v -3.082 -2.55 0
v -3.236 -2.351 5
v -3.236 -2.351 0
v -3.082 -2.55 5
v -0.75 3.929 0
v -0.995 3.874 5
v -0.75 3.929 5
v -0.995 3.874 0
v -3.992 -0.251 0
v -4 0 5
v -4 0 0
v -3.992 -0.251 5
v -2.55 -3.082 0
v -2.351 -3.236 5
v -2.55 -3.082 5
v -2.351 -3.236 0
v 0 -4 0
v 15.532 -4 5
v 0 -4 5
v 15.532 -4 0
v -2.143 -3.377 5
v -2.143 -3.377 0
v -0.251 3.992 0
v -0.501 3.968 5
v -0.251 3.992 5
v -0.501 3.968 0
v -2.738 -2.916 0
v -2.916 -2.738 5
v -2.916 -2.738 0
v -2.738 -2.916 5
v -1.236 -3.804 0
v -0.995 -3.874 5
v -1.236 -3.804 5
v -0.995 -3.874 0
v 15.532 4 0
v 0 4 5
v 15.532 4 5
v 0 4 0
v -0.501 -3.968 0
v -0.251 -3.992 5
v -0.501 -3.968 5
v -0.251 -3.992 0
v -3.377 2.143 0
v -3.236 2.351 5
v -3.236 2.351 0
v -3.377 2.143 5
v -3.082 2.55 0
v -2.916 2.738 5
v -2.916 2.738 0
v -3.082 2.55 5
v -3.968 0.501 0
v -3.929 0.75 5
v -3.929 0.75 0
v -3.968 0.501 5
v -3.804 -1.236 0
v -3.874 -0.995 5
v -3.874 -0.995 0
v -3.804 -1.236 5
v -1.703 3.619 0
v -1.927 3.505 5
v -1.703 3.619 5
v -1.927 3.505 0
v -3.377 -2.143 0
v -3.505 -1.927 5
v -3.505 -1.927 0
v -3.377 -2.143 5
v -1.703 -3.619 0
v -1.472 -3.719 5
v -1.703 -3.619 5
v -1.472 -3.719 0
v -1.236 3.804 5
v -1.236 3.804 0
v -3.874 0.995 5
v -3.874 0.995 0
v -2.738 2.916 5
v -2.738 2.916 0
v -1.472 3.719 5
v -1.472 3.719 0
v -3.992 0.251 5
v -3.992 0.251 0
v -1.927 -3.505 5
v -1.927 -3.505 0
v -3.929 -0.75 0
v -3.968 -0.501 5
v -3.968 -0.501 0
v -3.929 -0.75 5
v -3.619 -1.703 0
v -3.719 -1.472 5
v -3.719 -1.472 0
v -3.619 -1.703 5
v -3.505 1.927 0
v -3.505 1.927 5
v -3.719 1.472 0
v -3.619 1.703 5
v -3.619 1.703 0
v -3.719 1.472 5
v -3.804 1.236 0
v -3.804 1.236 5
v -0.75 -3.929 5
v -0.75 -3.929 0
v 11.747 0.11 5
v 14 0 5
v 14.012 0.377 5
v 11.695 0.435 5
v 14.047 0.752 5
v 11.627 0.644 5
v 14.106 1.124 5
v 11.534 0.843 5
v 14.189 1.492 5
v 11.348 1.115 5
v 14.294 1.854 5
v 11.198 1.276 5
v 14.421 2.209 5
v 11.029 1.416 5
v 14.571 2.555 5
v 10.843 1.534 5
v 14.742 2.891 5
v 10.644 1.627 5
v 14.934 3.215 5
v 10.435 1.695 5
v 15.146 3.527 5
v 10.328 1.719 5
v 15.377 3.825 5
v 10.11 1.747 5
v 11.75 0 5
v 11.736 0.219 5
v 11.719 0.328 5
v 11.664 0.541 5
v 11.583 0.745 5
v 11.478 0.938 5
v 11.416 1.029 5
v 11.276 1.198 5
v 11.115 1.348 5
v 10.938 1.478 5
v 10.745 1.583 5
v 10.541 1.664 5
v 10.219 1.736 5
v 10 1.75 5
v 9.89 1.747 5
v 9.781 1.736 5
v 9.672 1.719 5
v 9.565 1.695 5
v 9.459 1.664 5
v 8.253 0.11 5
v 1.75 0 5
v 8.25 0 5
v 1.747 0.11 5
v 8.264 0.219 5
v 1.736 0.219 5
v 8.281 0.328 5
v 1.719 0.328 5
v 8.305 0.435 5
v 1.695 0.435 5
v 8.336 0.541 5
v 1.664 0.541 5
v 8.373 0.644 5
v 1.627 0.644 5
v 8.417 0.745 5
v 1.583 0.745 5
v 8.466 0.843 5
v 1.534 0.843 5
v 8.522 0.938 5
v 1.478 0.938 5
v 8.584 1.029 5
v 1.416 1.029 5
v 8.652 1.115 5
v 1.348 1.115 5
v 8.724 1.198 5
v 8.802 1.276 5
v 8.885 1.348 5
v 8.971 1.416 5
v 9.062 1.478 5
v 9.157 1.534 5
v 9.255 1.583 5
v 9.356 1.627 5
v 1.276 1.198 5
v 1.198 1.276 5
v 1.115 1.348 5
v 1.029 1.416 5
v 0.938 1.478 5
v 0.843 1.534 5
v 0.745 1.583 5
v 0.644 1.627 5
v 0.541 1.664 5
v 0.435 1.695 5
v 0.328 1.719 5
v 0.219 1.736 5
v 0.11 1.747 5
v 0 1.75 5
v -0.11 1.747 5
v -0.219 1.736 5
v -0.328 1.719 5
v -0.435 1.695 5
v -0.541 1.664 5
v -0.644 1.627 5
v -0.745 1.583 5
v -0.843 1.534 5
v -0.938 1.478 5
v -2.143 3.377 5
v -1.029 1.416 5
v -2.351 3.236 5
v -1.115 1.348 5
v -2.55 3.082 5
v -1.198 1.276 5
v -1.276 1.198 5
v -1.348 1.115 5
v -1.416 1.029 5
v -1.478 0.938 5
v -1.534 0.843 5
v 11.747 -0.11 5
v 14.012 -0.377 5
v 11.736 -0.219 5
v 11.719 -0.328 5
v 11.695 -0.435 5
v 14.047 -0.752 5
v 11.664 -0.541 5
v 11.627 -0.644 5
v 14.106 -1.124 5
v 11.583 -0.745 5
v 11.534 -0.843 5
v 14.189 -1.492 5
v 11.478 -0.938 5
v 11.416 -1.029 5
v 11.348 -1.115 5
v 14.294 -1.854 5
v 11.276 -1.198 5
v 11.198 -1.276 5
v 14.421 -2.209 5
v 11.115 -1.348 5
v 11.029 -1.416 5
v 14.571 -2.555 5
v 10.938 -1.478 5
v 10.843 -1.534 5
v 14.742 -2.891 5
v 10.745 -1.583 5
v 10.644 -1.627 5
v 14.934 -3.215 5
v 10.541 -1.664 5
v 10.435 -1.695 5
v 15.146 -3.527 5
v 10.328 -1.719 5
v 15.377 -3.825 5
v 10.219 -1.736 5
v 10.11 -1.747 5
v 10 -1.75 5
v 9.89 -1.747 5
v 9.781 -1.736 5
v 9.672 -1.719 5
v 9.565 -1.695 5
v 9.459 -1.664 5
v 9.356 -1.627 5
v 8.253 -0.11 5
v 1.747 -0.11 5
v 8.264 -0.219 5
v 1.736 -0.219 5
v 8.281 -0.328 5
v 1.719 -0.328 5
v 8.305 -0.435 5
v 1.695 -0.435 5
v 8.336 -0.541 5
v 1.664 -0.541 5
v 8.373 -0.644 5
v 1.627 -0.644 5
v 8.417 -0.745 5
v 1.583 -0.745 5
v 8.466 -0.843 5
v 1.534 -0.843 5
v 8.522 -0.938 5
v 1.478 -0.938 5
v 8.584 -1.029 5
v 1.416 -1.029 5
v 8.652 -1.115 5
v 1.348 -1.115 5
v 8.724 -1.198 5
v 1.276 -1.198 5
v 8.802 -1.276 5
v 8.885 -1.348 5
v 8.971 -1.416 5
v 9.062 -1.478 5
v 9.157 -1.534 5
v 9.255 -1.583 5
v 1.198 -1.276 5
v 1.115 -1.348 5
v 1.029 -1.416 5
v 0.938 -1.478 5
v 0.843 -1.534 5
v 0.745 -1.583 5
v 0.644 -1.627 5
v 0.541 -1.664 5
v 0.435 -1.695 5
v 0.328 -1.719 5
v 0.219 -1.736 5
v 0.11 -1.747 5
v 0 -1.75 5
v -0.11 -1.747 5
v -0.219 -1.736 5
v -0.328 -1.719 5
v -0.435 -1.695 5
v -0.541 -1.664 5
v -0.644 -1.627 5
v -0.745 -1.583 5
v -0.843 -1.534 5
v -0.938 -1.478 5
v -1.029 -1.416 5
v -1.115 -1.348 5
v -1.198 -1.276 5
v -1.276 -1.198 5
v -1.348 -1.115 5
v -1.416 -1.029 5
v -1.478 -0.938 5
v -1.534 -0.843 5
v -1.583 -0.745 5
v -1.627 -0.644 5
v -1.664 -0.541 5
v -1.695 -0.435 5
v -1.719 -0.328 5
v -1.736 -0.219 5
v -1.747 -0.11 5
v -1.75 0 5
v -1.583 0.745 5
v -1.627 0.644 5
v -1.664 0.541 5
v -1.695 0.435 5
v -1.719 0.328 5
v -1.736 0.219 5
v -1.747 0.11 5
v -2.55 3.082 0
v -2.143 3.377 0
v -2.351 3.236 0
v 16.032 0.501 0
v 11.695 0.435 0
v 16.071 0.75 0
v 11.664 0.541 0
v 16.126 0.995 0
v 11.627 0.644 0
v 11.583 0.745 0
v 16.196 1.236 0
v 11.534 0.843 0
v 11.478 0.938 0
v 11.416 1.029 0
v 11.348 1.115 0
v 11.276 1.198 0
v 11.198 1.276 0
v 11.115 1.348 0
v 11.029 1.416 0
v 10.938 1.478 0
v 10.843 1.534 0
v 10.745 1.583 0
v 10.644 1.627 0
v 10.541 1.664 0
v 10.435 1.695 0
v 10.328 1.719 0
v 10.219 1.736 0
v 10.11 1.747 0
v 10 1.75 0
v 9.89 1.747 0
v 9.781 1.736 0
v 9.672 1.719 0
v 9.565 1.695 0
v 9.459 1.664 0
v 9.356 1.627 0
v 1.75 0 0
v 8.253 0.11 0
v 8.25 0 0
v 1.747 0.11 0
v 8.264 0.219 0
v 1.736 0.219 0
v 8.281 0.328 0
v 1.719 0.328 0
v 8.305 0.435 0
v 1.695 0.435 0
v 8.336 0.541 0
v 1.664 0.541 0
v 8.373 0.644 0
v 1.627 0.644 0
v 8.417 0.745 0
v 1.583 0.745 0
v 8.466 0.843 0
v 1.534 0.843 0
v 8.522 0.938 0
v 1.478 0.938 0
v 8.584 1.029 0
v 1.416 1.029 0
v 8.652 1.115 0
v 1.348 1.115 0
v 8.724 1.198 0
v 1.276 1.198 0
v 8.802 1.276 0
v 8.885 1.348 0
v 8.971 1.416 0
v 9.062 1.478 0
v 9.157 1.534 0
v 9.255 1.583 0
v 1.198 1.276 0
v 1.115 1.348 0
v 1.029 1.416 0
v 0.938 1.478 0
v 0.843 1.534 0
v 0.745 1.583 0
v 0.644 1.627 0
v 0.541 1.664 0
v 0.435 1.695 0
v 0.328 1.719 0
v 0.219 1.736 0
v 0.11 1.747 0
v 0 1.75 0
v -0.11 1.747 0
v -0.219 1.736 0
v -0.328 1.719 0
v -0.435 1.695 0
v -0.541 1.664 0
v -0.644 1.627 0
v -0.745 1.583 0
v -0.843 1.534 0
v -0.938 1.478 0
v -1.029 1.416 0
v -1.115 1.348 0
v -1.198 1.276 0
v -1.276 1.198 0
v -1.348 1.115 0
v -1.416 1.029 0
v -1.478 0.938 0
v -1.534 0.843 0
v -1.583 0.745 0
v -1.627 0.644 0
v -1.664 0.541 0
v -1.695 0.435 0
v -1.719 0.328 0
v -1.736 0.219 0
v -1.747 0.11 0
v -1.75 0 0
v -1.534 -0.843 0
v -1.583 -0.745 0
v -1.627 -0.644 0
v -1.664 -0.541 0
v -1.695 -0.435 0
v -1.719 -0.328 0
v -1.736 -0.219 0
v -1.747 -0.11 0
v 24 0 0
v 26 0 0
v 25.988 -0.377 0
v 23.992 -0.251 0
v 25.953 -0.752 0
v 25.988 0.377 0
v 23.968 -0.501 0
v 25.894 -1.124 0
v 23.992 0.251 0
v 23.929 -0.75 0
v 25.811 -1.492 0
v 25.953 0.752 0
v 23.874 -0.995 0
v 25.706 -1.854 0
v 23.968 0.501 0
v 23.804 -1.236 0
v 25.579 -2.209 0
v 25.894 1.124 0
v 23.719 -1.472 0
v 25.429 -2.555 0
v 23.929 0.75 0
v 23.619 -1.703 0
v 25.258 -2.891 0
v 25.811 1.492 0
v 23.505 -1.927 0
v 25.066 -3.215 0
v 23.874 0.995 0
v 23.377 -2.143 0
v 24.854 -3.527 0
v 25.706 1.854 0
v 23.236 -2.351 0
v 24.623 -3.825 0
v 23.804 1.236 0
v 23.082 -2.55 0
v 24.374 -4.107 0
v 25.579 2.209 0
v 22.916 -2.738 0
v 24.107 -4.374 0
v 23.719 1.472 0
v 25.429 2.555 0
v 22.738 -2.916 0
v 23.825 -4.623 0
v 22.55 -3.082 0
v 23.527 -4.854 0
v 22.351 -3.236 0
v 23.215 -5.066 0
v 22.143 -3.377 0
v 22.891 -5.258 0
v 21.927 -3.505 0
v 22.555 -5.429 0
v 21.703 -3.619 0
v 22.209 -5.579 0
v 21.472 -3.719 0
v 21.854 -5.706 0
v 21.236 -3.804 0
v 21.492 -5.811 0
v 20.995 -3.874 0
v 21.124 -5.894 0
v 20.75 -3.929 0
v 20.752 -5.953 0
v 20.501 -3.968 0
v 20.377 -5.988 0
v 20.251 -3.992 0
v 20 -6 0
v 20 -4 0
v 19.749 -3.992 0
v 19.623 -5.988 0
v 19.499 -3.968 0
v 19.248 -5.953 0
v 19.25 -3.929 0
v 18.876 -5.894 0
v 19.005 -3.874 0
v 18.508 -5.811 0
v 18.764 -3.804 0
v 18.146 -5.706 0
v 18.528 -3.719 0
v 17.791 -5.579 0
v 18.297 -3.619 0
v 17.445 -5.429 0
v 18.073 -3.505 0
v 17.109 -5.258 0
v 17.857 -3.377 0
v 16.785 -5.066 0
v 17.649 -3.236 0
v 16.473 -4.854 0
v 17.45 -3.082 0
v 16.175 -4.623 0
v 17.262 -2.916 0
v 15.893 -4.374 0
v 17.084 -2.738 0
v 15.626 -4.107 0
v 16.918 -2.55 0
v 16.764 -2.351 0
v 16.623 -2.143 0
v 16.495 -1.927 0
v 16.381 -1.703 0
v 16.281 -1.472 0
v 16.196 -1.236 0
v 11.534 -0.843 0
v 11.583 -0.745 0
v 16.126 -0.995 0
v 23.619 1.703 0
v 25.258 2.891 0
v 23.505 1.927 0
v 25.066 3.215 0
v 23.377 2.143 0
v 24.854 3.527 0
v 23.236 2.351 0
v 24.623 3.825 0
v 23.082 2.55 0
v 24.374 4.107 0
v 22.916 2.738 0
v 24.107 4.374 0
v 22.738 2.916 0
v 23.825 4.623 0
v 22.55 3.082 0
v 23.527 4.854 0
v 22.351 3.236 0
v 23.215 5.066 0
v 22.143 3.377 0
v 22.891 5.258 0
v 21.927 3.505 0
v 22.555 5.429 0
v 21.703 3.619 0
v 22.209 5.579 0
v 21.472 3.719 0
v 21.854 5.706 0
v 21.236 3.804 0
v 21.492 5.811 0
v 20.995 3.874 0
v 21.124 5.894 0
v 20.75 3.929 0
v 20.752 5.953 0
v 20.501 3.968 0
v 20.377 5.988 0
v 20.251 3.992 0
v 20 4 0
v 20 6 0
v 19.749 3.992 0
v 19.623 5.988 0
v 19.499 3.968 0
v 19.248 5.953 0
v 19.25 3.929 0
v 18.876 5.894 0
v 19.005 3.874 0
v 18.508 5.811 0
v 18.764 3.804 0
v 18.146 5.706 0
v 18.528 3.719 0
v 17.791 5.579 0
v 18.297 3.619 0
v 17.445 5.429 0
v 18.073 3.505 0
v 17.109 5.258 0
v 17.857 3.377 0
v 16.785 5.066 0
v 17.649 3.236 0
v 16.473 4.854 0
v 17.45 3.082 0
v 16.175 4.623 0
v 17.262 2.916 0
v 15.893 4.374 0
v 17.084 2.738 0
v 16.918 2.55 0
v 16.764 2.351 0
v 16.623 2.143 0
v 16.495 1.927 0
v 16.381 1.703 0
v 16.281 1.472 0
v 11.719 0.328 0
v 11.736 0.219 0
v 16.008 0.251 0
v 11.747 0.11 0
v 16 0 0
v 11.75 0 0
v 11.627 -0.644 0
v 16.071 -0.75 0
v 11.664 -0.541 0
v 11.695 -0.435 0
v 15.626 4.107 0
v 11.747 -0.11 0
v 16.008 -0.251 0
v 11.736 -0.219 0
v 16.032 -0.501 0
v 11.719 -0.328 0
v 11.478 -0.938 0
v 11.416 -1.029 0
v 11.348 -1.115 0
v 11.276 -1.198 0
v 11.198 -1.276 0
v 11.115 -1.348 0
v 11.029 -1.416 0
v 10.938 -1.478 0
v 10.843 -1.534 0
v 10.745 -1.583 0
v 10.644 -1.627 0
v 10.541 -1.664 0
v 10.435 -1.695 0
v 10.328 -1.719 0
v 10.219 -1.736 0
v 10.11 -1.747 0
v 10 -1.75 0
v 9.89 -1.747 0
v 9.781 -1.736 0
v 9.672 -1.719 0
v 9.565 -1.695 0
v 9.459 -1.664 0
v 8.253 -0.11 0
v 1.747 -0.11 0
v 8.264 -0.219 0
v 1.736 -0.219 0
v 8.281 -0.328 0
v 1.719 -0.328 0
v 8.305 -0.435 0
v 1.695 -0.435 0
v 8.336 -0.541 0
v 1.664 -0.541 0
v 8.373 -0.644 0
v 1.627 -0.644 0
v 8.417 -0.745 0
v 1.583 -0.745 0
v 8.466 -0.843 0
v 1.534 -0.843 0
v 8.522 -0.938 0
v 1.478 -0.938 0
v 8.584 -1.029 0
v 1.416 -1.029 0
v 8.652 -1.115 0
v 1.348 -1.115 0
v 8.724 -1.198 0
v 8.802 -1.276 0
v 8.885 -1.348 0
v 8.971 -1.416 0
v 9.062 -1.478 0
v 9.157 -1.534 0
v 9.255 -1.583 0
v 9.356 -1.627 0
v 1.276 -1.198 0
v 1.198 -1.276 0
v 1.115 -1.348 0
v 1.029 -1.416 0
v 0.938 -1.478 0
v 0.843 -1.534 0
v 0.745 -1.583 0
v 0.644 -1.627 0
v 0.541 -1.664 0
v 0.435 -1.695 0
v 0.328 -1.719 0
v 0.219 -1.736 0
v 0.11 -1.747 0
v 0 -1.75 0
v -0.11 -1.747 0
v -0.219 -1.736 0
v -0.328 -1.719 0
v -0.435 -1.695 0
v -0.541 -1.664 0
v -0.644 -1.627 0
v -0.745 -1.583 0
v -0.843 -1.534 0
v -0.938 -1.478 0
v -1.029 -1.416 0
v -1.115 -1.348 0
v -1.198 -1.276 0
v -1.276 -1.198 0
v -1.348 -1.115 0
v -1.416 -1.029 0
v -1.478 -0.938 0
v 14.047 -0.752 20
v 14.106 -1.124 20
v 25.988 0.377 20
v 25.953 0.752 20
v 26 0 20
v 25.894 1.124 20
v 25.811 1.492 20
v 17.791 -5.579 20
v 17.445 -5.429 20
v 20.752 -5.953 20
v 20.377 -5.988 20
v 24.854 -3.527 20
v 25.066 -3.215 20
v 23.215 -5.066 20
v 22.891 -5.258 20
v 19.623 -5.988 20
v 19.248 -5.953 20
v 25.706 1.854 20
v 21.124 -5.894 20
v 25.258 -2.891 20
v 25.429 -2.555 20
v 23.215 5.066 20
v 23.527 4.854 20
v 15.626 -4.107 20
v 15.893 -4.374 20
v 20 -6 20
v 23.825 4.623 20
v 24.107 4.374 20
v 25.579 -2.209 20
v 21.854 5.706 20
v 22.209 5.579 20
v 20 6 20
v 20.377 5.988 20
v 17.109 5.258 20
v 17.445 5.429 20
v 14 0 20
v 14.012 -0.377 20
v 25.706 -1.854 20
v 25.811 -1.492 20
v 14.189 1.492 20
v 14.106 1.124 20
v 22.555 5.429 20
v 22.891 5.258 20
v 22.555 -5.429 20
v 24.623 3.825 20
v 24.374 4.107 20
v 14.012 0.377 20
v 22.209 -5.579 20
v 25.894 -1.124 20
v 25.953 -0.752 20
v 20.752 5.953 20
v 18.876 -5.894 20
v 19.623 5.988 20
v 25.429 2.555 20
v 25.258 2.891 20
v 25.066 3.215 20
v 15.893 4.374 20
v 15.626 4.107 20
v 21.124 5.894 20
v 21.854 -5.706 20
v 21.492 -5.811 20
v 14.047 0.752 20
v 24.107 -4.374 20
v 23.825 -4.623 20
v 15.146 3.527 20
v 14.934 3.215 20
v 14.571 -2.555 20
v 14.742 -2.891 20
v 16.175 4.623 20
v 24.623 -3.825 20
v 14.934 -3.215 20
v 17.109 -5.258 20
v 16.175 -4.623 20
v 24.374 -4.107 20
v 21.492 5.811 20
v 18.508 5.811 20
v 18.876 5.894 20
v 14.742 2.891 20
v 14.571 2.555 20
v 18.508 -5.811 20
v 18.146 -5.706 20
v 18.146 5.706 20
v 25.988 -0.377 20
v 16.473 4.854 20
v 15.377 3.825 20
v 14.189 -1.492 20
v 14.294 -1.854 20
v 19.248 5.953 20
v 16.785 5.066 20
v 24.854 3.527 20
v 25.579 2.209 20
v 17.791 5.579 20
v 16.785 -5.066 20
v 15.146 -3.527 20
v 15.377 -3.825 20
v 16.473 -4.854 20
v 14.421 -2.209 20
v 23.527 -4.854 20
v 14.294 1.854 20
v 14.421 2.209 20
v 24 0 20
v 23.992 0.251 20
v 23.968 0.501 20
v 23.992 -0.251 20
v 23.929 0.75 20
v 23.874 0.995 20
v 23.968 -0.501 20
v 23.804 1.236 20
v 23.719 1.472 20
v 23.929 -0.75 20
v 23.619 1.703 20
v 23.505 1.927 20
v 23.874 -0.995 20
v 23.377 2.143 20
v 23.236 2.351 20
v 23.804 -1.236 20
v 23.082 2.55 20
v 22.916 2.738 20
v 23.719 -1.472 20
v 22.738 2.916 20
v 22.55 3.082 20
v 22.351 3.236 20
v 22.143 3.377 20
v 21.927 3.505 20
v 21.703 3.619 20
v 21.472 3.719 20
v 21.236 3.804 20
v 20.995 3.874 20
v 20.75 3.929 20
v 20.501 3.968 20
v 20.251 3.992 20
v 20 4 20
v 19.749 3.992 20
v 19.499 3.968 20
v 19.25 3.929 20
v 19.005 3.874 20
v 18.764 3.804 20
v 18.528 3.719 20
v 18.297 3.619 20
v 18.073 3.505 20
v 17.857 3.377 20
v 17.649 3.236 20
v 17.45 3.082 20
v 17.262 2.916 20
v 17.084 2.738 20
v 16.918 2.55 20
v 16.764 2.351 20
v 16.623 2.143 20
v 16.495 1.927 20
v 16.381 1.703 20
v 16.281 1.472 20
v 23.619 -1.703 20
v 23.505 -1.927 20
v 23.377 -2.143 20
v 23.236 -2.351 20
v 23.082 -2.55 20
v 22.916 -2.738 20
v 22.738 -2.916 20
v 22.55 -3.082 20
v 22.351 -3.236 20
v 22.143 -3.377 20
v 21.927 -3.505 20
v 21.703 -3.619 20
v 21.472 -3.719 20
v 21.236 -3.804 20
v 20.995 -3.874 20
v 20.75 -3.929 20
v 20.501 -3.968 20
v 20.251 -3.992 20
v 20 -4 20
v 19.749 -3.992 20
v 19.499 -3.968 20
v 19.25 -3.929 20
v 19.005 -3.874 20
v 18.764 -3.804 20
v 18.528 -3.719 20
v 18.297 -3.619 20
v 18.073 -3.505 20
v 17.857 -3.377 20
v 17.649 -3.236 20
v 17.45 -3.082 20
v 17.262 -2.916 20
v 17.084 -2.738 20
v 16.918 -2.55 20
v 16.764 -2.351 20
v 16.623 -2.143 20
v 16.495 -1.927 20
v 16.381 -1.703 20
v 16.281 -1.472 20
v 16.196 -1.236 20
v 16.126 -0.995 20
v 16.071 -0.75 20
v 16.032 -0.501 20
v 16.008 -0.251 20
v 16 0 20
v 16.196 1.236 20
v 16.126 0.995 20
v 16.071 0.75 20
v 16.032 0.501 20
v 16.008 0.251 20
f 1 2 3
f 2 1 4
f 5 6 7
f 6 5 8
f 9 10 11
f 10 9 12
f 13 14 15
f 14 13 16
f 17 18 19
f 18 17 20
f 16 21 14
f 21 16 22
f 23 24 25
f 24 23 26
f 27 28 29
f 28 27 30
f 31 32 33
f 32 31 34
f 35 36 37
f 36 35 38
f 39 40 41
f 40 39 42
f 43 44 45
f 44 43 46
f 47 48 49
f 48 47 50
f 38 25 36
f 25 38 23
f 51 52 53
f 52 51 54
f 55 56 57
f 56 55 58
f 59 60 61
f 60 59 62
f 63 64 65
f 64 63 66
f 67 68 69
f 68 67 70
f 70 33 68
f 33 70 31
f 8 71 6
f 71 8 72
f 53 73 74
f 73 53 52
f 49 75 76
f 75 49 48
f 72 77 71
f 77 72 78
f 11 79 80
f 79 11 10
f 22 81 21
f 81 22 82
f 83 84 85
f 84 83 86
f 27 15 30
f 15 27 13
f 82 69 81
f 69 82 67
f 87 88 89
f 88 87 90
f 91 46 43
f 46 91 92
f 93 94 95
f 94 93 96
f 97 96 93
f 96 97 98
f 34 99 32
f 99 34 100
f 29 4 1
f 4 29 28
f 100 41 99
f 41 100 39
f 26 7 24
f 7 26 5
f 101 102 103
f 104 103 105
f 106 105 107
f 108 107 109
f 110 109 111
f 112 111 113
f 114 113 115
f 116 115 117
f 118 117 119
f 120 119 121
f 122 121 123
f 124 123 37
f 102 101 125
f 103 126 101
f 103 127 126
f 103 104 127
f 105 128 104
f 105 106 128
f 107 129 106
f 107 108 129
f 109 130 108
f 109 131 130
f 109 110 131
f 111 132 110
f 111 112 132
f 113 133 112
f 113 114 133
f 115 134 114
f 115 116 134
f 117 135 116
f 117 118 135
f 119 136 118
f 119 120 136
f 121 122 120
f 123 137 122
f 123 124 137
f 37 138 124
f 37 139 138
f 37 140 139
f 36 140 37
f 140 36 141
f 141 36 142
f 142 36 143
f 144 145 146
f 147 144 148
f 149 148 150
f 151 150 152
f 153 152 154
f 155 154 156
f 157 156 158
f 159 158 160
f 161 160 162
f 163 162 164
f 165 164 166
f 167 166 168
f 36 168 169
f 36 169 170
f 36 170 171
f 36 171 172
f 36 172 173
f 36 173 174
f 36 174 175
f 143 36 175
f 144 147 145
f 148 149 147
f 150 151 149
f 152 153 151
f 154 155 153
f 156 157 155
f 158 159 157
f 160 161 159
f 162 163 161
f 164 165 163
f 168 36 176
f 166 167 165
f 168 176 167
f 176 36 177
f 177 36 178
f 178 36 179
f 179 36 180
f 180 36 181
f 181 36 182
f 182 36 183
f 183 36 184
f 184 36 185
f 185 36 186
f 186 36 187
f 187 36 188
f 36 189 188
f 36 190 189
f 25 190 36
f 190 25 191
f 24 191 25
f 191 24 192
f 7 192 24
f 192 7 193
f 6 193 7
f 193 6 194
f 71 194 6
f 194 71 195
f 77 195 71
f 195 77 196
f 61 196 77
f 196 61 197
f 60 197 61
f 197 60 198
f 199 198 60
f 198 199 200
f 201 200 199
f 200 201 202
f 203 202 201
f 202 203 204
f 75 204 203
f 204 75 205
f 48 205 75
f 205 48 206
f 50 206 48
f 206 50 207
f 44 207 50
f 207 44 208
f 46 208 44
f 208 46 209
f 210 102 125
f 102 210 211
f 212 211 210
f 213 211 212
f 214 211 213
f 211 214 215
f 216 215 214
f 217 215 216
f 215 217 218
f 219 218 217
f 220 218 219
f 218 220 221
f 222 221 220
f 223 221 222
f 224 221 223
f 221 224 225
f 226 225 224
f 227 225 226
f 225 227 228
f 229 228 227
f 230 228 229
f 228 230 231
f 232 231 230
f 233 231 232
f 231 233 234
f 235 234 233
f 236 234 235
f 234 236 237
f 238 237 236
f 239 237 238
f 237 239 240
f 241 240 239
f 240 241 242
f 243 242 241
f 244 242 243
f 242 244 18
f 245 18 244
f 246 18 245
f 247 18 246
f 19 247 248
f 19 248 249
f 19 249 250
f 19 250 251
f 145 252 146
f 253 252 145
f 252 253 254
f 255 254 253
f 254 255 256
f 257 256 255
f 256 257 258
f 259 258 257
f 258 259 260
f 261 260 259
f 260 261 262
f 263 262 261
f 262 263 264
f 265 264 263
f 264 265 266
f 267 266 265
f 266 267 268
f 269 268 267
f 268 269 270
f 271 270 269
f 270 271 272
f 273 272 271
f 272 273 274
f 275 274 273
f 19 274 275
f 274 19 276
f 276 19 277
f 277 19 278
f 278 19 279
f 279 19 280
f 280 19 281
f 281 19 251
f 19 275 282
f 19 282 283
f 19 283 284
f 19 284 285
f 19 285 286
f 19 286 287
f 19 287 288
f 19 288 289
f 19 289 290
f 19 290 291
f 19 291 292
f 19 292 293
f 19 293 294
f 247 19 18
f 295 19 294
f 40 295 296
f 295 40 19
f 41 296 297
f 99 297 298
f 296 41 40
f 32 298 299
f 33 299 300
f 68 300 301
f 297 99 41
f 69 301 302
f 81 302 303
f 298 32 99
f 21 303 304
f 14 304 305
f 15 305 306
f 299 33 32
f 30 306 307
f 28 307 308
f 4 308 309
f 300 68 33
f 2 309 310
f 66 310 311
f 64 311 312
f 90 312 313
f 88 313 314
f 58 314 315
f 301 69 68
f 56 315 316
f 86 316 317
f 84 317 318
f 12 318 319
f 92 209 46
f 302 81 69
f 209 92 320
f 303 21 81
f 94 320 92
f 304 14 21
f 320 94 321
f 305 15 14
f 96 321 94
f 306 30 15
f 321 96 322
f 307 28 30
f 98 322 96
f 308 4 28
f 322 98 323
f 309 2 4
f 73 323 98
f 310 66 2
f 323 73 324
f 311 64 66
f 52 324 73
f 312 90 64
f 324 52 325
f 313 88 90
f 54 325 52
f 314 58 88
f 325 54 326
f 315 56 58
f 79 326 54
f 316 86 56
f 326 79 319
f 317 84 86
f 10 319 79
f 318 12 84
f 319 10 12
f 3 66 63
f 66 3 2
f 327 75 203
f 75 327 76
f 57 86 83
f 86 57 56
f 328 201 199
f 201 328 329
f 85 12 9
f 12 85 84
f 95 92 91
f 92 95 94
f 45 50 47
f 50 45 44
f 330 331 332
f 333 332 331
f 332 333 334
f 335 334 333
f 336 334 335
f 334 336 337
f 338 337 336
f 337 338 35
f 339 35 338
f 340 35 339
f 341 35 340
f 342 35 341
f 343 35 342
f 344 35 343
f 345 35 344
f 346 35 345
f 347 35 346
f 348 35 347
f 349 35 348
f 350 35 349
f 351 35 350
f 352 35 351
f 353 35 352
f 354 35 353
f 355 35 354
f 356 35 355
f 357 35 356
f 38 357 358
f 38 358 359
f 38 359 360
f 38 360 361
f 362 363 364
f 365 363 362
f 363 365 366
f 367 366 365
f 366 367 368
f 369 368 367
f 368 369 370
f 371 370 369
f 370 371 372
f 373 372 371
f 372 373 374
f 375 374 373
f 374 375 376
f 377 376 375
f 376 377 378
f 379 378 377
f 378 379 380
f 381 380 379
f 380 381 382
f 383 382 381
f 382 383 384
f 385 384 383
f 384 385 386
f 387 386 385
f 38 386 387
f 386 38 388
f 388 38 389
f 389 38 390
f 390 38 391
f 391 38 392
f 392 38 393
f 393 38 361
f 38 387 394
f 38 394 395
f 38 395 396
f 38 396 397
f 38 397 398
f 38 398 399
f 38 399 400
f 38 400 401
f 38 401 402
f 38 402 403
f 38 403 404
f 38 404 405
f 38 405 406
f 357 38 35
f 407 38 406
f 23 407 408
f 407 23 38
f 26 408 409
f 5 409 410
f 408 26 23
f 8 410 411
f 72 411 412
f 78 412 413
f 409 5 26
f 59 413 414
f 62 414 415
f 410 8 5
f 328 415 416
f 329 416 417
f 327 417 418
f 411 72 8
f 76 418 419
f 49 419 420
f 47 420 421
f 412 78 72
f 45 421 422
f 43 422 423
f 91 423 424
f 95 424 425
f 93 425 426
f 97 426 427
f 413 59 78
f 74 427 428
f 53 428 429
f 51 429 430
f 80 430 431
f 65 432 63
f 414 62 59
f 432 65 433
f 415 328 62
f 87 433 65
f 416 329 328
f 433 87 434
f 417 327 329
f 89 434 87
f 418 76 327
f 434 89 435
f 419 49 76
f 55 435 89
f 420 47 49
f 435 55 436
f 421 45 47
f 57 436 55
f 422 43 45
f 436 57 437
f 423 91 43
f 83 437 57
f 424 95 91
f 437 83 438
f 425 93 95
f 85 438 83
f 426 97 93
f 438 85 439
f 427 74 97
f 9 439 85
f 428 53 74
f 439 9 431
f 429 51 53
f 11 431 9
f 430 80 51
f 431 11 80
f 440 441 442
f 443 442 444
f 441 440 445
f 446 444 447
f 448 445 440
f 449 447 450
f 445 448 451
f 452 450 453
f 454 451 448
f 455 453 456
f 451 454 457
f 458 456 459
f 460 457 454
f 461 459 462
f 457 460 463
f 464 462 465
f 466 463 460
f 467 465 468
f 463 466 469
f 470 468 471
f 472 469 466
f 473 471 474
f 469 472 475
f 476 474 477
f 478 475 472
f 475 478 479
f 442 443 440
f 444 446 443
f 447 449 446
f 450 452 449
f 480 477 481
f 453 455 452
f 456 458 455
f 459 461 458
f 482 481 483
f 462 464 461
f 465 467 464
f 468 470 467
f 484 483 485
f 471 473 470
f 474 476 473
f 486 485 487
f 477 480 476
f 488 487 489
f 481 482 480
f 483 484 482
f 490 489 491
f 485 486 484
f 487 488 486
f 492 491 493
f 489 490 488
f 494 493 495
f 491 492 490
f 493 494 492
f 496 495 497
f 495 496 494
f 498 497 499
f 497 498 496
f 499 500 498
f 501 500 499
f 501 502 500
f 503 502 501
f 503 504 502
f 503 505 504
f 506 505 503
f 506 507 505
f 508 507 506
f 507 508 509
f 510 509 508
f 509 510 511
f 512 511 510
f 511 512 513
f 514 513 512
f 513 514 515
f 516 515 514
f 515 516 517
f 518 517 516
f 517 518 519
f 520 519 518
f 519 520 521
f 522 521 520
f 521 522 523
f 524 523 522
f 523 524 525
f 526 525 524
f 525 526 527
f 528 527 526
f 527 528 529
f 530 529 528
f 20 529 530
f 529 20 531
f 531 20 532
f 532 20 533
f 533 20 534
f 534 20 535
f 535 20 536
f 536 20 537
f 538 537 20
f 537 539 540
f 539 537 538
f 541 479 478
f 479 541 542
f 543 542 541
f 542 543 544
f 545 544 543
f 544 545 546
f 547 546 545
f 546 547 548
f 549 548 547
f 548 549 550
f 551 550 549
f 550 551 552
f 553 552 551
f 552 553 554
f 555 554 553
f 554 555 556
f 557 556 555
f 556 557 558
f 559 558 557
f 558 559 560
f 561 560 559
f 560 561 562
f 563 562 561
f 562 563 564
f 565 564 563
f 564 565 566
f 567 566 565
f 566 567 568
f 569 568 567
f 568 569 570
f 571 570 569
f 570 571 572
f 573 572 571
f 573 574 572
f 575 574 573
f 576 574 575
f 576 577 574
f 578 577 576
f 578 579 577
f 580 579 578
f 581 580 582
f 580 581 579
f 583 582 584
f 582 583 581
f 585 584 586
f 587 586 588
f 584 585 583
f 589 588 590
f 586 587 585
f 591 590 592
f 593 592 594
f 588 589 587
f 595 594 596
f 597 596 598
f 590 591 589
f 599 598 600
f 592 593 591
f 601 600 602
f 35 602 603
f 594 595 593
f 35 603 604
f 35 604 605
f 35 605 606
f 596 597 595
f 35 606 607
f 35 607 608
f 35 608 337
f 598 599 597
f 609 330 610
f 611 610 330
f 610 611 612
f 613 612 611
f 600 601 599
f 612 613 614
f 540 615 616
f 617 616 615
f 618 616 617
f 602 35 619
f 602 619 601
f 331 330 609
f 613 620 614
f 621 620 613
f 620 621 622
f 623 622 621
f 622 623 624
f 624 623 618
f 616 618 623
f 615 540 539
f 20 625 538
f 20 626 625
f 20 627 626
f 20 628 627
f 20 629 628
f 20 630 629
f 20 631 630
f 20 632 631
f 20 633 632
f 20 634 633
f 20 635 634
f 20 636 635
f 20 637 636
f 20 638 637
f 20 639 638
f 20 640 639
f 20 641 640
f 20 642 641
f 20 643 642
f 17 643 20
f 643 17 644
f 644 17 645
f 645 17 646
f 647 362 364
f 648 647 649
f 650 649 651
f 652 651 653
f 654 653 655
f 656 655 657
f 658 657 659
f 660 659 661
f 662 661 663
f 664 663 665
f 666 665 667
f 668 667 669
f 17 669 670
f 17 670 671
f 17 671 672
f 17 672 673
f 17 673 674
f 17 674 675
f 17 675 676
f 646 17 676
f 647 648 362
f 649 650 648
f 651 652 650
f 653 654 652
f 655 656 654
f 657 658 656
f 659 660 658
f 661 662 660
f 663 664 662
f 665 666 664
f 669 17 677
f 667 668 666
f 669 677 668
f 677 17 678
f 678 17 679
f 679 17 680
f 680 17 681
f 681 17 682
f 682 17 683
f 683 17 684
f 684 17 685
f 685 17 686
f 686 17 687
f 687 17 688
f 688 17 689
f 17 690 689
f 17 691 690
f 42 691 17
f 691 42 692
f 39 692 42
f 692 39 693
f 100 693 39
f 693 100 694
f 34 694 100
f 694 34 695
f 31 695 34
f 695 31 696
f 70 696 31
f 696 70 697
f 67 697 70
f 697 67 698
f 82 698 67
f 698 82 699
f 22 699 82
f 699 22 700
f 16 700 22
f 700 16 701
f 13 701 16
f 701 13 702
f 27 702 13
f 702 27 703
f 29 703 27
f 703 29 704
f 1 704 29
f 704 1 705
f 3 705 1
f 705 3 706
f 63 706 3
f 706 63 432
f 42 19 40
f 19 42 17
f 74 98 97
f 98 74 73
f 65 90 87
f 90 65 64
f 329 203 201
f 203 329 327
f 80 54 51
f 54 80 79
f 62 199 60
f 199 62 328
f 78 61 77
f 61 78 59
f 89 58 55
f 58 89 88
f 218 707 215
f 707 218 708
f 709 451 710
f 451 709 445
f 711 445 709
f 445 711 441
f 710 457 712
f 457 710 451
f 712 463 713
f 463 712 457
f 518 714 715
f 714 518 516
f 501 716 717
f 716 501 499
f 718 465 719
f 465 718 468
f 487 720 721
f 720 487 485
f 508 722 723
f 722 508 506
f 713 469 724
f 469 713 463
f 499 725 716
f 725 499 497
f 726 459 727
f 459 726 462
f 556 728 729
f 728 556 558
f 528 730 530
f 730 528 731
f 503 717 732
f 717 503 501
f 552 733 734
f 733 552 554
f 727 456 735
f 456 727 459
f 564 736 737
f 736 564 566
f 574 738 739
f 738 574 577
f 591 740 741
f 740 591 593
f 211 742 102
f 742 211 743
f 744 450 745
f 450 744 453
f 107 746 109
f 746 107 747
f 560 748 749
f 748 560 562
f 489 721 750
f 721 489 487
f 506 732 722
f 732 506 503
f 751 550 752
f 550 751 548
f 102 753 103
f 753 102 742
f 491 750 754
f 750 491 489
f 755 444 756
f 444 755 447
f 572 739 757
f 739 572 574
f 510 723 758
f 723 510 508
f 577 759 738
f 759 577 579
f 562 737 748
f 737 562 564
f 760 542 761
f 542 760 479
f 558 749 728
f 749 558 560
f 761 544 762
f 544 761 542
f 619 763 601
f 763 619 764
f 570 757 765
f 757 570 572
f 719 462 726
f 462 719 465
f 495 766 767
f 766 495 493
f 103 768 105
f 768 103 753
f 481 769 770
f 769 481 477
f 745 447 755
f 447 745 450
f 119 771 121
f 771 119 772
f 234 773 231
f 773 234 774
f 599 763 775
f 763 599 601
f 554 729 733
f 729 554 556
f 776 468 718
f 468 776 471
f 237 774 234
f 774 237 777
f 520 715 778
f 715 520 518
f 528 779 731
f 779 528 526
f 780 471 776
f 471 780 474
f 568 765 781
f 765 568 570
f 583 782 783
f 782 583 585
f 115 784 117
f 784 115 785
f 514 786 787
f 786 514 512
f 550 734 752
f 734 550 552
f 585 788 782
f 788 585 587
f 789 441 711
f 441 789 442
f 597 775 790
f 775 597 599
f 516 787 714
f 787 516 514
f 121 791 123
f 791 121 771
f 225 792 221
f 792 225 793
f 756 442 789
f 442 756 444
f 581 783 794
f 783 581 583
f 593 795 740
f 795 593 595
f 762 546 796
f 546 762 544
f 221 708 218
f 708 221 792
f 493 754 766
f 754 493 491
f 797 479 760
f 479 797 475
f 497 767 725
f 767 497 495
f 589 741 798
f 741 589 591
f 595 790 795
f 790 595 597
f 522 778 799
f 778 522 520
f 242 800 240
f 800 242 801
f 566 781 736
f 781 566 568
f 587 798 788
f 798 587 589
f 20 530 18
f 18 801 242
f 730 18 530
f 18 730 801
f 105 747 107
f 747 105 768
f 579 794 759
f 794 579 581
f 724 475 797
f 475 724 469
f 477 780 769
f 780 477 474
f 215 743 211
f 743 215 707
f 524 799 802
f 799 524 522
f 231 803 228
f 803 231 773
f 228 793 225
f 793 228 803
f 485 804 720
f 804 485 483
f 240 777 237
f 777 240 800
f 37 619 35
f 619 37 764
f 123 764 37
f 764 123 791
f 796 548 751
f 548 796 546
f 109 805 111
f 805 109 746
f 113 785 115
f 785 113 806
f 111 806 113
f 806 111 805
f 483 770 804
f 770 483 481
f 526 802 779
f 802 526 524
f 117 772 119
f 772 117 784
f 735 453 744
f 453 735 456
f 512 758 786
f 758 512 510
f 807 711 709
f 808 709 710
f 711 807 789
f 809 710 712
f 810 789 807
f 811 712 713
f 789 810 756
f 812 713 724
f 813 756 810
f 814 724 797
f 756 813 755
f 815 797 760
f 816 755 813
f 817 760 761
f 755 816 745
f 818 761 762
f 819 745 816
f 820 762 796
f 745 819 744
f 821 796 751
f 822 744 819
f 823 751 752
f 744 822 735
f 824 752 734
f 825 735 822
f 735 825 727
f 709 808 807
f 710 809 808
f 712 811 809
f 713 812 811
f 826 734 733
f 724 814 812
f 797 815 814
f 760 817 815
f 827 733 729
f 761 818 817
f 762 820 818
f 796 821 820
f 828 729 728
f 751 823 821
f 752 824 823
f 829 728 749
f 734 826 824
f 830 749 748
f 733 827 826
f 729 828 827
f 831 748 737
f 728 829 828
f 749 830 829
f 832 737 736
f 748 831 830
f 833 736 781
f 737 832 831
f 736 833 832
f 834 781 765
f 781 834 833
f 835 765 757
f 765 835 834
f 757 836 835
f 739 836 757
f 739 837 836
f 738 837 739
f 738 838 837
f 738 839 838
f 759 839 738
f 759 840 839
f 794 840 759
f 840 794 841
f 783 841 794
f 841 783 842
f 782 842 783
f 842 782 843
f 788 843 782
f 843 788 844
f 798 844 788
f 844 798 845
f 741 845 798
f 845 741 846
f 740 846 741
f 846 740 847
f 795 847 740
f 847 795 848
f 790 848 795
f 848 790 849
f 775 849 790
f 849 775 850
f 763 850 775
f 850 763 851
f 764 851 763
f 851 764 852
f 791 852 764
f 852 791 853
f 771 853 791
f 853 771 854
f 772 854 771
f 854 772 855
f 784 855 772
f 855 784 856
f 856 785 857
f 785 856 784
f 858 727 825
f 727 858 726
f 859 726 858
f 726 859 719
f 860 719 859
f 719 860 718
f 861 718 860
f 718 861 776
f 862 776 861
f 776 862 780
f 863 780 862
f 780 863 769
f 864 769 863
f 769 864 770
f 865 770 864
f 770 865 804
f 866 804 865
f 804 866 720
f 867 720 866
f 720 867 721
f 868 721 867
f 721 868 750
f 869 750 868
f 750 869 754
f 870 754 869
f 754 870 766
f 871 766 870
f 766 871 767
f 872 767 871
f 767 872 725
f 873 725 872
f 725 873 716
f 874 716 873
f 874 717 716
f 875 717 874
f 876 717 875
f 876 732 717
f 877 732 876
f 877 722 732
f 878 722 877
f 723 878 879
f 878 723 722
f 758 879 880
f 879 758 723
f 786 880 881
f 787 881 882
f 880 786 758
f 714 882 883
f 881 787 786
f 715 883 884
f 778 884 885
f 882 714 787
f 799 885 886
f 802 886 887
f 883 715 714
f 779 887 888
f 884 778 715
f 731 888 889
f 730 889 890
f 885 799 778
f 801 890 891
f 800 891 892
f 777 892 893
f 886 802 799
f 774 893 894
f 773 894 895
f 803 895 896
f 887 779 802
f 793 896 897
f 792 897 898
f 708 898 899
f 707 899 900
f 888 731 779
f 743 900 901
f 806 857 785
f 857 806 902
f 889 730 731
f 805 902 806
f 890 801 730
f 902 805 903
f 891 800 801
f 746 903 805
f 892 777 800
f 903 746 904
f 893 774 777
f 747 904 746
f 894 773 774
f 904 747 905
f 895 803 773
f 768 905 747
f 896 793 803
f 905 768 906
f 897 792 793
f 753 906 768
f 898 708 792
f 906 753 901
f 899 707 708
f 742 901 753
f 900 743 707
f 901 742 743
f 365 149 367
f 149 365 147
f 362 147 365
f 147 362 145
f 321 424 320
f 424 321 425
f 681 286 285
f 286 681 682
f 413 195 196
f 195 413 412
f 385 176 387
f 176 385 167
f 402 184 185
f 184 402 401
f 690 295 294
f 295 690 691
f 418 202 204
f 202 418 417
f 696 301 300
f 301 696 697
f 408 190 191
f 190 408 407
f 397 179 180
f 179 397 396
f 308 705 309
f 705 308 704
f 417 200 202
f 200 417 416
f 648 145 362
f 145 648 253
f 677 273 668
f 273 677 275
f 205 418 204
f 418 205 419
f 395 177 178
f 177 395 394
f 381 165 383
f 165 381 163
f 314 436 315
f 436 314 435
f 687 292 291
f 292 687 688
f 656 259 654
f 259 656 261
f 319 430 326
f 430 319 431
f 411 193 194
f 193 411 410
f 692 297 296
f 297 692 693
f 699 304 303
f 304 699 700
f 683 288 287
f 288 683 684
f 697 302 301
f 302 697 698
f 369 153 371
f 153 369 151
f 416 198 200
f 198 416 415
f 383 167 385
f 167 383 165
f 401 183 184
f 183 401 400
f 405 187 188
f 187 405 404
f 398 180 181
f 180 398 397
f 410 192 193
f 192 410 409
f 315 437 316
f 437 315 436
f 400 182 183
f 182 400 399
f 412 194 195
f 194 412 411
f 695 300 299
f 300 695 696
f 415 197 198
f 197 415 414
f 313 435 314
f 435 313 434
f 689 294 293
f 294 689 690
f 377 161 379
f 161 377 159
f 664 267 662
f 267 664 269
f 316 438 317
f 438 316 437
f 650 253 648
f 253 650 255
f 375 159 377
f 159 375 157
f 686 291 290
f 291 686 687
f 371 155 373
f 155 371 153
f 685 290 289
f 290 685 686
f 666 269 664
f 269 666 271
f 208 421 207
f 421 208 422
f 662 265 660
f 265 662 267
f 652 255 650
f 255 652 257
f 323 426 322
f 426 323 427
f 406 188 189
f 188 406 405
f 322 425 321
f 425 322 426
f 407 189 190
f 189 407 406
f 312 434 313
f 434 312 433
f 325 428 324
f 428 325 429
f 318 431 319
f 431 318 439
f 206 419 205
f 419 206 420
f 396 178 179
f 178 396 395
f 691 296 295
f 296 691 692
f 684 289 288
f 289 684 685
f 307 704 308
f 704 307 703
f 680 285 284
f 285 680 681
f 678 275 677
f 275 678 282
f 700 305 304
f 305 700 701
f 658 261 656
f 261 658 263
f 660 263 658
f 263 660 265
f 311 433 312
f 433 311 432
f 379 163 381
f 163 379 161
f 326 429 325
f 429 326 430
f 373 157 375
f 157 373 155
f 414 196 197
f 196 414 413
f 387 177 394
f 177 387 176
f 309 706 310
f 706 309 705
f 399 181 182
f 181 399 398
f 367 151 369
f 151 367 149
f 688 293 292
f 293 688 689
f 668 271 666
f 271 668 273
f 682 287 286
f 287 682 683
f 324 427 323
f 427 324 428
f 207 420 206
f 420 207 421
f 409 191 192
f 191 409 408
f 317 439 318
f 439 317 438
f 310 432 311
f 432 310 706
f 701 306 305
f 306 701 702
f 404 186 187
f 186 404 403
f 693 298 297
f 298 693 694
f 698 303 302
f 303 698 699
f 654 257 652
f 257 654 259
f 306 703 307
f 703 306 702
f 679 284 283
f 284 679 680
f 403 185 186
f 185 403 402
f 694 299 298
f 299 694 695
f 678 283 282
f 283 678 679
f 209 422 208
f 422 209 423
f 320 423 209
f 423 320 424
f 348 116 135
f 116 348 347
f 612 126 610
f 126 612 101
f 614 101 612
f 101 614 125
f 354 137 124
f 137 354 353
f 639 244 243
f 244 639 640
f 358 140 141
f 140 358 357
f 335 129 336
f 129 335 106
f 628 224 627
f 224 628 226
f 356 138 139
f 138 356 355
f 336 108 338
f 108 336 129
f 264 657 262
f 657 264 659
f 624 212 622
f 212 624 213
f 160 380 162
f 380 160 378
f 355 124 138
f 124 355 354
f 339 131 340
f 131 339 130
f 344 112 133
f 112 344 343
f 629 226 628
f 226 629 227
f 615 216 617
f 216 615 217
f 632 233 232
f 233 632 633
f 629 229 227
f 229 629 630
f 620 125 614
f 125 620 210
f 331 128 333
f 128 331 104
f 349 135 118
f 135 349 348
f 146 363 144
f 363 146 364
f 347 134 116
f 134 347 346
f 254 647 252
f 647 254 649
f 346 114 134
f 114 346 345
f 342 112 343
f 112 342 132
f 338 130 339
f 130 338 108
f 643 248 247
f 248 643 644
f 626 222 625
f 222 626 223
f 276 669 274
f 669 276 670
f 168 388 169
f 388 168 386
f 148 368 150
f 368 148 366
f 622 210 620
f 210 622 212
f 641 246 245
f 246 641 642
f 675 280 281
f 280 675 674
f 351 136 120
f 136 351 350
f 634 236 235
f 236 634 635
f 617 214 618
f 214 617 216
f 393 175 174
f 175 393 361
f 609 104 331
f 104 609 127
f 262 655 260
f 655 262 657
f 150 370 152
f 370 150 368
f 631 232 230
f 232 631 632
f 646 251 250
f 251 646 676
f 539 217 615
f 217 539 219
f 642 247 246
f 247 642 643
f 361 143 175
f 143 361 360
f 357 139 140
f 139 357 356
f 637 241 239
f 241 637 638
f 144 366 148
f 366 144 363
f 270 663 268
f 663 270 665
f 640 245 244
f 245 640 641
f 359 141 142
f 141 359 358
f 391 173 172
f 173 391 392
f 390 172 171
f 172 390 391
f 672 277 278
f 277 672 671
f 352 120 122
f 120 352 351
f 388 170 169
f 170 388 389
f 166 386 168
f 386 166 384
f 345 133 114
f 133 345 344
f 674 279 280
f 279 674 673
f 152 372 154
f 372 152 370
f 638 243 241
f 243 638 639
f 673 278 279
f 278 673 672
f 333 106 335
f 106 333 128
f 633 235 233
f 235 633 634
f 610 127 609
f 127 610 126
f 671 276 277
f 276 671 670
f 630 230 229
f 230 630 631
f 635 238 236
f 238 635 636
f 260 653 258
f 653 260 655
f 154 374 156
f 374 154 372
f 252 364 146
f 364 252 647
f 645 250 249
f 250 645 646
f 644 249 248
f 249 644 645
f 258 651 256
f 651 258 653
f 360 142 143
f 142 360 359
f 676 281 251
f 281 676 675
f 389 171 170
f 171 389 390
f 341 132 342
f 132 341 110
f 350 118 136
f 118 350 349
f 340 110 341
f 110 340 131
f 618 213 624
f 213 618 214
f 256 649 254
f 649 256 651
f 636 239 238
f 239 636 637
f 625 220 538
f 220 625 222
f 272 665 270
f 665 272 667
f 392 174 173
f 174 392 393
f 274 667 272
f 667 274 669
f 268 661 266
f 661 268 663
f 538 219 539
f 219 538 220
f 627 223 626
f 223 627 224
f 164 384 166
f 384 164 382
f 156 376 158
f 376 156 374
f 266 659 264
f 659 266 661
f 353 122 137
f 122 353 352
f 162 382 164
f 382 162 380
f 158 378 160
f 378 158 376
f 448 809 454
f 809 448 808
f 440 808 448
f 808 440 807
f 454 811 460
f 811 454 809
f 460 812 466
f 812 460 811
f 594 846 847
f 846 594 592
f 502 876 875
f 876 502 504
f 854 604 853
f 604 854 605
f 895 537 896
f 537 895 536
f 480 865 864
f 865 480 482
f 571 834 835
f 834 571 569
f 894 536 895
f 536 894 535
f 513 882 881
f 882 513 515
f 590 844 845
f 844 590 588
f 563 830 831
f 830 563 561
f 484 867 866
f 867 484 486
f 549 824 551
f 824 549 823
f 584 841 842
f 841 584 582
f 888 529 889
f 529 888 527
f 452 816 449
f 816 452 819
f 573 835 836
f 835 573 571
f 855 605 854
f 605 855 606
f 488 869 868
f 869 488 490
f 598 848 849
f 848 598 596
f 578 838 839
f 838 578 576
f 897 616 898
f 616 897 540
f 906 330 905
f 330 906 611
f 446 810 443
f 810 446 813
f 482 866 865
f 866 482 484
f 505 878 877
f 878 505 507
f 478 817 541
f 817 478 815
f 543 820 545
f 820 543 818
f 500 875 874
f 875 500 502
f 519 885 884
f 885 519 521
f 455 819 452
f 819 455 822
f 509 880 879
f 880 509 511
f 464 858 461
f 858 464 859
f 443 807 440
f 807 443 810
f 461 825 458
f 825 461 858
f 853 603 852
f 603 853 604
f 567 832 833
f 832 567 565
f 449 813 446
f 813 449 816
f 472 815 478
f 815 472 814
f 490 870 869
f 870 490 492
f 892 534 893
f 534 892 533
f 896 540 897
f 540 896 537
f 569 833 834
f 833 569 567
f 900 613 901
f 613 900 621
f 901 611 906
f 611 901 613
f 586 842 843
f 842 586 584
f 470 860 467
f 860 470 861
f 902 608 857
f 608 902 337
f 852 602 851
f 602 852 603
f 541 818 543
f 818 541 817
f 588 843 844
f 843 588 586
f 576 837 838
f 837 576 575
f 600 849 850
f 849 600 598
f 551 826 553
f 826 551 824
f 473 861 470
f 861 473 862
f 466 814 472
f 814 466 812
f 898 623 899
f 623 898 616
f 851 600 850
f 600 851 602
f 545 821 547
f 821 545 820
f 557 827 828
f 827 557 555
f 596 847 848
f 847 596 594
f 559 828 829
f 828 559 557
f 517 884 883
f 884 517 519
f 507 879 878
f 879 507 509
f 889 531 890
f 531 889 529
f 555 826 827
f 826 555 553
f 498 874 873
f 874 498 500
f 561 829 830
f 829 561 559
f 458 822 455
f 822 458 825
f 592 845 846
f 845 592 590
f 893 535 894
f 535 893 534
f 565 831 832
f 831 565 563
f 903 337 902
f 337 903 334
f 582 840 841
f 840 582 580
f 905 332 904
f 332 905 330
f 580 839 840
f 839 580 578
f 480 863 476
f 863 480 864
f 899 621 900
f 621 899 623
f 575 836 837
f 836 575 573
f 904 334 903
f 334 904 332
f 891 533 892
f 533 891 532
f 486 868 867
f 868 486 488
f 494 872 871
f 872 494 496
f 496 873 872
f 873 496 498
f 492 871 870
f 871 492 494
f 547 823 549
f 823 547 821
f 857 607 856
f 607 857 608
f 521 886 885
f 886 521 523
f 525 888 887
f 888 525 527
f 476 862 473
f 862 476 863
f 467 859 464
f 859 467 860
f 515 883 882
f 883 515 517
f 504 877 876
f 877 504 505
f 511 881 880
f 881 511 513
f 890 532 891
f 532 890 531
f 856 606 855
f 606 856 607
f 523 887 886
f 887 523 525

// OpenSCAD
// file: parametros.scad
// Parametros - Editar apenas este ficheiro para alterar os restantes automaticamente
$fn = 100;

diam_parafuso = 3; // em mm. para um M2x20 o diâmetro é 2.
dist_orificios = 10; // distancia entre orificios para as barras
altura = 4; // altura das barras

// Comprimento máximo da barra. Para uma mesa de impressão de ± 20x20cm a dist máxima será sqrt(20**2 +20**2) ±= 28cm. O comprimento da barra será calculado de forma automaticamente de forma a ser multiplo da distância entre orifícios. 
comprimento_maximo = 220;
// main file
include <parametros.scad>

difference() {
union(){
    hull() {
        cylinder(5, d = diam_parafuso + 5);
        translate([dist_orificios*2, 0, 0])
            cylinder(5, d = diam_parafuso + 5);
    }
		translate([dist_orificios*2,0,0]) cylinder(20, d = 12);
	}
    for(i = [0 : 1]) {
        translate([i*dist_orificios, 0, -1])
            cylinder(10, d = diam_parafuso + 0.5);
    }
	translate([dist_orificios*2,0,-1]) cylinder(22, d = 8);
}
